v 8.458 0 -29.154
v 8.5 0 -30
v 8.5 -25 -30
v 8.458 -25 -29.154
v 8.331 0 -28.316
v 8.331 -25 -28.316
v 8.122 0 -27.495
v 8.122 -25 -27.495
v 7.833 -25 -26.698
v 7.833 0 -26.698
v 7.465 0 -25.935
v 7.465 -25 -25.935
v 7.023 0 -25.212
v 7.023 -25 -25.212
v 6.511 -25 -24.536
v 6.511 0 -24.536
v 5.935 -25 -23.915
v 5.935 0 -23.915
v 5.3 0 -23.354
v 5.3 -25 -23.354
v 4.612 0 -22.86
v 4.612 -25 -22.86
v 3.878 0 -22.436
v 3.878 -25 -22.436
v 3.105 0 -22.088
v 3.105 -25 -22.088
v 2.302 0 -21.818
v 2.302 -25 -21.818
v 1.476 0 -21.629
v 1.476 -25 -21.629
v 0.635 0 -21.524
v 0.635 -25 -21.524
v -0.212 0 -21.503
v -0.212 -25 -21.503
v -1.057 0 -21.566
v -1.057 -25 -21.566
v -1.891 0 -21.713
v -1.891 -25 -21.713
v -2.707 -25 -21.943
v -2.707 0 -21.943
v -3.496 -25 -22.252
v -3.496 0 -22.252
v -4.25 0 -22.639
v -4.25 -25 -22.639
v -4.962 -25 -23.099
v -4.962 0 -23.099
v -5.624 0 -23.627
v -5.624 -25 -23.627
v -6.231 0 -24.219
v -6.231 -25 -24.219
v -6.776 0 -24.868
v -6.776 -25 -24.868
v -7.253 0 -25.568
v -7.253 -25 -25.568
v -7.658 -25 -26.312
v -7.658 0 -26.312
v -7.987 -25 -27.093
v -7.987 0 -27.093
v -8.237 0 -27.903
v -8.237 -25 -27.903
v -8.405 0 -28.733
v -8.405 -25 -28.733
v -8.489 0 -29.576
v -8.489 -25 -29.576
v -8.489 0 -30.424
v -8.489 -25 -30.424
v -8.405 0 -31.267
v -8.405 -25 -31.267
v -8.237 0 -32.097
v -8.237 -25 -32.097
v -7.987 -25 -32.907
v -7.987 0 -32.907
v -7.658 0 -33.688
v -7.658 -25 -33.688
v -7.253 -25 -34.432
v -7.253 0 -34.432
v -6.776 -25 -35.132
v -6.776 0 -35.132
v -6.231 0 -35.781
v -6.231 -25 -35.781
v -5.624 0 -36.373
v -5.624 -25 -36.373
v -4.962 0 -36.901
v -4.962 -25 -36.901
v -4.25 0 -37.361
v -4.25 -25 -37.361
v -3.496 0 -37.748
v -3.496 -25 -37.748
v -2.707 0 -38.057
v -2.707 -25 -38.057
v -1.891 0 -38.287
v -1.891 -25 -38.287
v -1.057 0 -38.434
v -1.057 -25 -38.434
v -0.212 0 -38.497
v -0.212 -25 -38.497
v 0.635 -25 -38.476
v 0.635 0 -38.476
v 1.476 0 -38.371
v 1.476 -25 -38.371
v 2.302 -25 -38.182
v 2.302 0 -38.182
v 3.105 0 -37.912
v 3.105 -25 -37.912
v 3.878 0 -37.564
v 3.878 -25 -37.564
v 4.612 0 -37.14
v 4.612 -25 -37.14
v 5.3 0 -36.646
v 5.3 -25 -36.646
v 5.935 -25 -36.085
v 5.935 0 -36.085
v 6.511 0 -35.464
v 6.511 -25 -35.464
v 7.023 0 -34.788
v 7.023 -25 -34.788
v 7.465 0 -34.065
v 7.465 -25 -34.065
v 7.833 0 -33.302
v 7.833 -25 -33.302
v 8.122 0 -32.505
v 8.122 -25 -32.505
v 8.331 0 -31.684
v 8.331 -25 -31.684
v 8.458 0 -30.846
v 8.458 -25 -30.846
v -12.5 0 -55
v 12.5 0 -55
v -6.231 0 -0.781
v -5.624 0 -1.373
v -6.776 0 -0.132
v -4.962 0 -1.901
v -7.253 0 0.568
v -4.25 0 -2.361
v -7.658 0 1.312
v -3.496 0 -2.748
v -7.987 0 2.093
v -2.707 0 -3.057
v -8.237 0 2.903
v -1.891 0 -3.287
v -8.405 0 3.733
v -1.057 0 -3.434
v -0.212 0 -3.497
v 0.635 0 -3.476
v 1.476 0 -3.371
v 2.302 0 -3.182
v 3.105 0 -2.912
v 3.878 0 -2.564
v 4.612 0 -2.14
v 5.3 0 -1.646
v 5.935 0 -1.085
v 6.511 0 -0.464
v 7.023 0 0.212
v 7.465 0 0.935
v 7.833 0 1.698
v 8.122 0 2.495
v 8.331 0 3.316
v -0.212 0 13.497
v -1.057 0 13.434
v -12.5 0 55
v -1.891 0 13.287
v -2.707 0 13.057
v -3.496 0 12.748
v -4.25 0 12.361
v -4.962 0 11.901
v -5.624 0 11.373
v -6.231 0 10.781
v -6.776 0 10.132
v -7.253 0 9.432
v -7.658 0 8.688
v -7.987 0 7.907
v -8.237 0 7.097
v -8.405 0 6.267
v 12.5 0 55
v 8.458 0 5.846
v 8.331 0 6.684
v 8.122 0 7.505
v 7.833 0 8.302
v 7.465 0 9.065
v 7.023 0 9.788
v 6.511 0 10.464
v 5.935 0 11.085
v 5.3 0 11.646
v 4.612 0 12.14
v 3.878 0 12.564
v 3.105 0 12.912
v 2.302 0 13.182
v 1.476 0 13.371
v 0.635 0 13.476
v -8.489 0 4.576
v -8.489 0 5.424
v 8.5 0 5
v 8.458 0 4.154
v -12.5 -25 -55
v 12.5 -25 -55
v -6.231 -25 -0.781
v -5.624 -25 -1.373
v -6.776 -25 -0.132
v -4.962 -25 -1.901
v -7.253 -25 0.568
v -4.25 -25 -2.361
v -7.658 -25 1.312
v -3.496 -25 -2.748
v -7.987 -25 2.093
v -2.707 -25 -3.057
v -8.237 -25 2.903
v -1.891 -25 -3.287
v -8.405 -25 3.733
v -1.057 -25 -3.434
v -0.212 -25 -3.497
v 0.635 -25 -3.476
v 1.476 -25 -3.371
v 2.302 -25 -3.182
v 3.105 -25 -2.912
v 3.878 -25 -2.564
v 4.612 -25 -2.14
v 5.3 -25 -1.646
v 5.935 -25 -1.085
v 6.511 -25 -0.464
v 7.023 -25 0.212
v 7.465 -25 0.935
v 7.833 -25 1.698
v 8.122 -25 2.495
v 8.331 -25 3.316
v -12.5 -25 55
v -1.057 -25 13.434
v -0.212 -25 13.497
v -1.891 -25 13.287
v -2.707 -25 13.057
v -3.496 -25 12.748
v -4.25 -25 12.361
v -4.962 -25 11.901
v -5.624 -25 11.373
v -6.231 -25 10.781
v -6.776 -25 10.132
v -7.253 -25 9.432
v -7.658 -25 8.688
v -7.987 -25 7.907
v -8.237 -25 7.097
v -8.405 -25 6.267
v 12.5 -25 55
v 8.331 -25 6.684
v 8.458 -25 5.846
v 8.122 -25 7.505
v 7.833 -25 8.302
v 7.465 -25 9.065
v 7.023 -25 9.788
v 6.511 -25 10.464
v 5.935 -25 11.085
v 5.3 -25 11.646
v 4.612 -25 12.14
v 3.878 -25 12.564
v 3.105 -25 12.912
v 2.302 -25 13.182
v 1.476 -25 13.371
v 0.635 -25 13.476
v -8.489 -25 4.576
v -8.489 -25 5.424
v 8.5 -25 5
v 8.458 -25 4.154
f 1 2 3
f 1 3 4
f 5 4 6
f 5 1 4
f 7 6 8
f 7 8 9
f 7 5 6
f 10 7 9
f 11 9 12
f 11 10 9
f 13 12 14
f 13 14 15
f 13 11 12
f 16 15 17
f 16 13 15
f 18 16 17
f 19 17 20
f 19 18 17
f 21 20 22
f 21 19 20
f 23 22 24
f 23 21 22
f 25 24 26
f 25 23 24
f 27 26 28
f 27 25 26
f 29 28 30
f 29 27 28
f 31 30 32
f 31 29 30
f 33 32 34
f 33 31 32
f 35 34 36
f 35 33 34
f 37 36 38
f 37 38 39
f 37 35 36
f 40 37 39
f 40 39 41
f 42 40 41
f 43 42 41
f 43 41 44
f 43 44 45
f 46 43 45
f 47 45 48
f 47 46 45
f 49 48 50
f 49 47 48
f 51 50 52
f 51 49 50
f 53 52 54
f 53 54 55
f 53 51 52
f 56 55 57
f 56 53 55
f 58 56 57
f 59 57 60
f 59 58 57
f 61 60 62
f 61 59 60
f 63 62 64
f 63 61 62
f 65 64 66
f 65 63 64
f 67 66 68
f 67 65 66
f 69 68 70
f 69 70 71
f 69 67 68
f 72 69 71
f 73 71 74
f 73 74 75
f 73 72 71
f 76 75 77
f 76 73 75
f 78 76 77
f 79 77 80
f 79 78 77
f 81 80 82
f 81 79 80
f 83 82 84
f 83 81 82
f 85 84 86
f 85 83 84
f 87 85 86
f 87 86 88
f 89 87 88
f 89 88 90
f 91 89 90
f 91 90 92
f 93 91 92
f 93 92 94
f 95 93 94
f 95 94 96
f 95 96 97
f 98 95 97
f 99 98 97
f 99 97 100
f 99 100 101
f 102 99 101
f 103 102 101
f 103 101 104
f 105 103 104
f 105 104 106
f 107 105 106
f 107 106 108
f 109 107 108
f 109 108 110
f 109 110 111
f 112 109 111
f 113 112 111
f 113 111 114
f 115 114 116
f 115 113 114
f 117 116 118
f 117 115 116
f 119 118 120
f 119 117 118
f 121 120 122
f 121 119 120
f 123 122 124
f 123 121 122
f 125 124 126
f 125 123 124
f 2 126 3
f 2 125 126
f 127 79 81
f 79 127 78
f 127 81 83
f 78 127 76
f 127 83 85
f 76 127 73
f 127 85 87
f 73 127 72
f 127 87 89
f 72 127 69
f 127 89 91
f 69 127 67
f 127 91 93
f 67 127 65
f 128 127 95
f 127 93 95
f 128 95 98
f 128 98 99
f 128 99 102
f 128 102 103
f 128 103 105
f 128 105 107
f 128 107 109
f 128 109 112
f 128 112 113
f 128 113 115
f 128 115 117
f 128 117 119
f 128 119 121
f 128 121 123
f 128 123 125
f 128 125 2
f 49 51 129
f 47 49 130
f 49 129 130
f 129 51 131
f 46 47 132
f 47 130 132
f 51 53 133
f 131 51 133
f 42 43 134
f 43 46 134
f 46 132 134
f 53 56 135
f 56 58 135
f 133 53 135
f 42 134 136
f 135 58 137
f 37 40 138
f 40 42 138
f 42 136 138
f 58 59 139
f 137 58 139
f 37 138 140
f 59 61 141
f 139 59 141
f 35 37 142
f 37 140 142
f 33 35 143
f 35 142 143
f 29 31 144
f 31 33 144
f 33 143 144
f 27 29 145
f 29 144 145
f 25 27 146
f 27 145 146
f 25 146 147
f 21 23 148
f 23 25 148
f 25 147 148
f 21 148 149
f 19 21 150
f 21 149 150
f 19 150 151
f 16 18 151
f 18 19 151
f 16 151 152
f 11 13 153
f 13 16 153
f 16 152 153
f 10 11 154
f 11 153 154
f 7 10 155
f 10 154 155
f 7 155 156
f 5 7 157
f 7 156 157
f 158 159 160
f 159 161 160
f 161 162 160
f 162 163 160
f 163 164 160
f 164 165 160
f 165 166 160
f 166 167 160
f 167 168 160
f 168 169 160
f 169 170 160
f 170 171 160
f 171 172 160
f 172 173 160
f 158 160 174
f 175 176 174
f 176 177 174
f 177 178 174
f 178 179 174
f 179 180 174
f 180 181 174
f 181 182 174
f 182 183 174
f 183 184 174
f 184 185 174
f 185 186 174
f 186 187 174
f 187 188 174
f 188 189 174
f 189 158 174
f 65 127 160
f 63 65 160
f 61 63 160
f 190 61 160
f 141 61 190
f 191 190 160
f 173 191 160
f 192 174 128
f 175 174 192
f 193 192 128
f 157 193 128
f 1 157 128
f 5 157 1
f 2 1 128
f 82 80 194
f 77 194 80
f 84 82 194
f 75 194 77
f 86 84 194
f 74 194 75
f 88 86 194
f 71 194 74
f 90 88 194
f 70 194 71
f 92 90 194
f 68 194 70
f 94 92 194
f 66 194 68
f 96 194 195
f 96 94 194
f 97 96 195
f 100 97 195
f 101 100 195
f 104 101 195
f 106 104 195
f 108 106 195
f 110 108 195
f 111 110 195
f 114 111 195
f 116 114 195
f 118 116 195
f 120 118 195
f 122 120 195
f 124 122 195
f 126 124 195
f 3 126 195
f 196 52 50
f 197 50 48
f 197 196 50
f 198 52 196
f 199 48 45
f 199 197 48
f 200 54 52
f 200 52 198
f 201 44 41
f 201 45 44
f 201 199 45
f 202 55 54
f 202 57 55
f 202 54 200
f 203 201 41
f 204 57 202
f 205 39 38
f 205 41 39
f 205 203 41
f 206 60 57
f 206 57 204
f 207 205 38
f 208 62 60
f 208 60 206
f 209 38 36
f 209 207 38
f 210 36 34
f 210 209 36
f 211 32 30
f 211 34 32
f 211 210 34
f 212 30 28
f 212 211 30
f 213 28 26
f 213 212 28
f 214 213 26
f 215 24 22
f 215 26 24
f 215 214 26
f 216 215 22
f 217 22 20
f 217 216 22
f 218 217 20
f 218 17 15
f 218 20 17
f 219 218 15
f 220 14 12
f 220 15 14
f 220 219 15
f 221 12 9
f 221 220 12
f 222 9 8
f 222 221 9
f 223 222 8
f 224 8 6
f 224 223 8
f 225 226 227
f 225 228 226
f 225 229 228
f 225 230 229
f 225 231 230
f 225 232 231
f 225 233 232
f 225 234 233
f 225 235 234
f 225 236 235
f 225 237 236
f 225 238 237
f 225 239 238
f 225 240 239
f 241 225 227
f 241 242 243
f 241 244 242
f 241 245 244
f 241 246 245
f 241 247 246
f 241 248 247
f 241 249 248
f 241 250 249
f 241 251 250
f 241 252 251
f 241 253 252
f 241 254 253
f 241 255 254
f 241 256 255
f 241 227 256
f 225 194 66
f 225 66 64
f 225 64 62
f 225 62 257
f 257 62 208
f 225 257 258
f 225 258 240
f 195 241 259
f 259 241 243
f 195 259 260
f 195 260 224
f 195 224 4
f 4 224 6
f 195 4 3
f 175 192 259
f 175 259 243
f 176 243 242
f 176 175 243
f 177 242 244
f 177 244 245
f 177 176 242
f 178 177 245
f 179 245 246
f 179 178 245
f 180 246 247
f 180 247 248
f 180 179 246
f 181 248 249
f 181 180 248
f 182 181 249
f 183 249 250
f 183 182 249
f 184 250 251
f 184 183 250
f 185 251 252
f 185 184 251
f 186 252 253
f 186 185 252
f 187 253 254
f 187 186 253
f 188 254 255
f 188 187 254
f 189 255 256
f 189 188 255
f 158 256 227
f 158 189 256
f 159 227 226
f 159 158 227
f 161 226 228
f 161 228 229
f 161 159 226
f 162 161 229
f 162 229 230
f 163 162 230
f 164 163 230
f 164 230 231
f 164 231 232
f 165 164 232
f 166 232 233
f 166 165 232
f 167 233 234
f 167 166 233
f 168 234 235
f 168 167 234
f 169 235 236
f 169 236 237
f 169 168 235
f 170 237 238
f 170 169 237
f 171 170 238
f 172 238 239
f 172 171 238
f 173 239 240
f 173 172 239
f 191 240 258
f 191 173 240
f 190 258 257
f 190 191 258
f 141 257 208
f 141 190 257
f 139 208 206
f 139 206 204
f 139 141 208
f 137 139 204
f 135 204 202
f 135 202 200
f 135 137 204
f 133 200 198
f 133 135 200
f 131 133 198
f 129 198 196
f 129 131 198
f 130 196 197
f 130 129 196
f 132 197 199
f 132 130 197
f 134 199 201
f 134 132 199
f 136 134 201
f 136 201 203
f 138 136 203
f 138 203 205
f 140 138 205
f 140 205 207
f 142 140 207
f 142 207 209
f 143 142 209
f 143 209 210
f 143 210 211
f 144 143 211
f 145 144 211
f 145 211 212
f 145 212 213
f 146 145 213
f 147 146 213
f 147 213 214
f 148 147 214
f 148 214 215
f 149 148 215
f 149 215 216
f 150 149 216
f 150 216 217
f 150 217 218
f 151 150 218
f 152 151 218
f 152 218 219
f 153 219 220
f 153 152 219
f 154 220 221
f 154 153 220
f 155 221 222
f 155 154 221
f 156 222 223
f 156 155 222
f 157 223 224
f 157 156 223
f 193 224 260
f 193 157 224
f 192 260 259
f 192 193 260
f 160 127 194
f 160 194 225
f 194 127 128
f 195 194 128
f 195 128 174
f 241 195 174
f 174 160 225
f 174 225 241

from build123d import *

# Parameters (mm, degrees)
SKETCH_W  = 25
SKETCH_H  = 110
SKETCH_R  = 8.5
PAD_DEPTH = 25


with BuildPart() as part:
    # Sketch → Pad (new body)
    with BuildSketch(Plane.XZ):
        Rectangle(SKETCH_W, SKETCH_H)
        with Locations((0, -30)):
            Circle(SKETCH_R, mode=Mode.SUBTRACT)
        with Locations((0, 5)):
            Circle(SKETCH_R, mode=Mode.SUBTRACT)
    extrude(amount=PAD_DEPTH)


solid = part.part
